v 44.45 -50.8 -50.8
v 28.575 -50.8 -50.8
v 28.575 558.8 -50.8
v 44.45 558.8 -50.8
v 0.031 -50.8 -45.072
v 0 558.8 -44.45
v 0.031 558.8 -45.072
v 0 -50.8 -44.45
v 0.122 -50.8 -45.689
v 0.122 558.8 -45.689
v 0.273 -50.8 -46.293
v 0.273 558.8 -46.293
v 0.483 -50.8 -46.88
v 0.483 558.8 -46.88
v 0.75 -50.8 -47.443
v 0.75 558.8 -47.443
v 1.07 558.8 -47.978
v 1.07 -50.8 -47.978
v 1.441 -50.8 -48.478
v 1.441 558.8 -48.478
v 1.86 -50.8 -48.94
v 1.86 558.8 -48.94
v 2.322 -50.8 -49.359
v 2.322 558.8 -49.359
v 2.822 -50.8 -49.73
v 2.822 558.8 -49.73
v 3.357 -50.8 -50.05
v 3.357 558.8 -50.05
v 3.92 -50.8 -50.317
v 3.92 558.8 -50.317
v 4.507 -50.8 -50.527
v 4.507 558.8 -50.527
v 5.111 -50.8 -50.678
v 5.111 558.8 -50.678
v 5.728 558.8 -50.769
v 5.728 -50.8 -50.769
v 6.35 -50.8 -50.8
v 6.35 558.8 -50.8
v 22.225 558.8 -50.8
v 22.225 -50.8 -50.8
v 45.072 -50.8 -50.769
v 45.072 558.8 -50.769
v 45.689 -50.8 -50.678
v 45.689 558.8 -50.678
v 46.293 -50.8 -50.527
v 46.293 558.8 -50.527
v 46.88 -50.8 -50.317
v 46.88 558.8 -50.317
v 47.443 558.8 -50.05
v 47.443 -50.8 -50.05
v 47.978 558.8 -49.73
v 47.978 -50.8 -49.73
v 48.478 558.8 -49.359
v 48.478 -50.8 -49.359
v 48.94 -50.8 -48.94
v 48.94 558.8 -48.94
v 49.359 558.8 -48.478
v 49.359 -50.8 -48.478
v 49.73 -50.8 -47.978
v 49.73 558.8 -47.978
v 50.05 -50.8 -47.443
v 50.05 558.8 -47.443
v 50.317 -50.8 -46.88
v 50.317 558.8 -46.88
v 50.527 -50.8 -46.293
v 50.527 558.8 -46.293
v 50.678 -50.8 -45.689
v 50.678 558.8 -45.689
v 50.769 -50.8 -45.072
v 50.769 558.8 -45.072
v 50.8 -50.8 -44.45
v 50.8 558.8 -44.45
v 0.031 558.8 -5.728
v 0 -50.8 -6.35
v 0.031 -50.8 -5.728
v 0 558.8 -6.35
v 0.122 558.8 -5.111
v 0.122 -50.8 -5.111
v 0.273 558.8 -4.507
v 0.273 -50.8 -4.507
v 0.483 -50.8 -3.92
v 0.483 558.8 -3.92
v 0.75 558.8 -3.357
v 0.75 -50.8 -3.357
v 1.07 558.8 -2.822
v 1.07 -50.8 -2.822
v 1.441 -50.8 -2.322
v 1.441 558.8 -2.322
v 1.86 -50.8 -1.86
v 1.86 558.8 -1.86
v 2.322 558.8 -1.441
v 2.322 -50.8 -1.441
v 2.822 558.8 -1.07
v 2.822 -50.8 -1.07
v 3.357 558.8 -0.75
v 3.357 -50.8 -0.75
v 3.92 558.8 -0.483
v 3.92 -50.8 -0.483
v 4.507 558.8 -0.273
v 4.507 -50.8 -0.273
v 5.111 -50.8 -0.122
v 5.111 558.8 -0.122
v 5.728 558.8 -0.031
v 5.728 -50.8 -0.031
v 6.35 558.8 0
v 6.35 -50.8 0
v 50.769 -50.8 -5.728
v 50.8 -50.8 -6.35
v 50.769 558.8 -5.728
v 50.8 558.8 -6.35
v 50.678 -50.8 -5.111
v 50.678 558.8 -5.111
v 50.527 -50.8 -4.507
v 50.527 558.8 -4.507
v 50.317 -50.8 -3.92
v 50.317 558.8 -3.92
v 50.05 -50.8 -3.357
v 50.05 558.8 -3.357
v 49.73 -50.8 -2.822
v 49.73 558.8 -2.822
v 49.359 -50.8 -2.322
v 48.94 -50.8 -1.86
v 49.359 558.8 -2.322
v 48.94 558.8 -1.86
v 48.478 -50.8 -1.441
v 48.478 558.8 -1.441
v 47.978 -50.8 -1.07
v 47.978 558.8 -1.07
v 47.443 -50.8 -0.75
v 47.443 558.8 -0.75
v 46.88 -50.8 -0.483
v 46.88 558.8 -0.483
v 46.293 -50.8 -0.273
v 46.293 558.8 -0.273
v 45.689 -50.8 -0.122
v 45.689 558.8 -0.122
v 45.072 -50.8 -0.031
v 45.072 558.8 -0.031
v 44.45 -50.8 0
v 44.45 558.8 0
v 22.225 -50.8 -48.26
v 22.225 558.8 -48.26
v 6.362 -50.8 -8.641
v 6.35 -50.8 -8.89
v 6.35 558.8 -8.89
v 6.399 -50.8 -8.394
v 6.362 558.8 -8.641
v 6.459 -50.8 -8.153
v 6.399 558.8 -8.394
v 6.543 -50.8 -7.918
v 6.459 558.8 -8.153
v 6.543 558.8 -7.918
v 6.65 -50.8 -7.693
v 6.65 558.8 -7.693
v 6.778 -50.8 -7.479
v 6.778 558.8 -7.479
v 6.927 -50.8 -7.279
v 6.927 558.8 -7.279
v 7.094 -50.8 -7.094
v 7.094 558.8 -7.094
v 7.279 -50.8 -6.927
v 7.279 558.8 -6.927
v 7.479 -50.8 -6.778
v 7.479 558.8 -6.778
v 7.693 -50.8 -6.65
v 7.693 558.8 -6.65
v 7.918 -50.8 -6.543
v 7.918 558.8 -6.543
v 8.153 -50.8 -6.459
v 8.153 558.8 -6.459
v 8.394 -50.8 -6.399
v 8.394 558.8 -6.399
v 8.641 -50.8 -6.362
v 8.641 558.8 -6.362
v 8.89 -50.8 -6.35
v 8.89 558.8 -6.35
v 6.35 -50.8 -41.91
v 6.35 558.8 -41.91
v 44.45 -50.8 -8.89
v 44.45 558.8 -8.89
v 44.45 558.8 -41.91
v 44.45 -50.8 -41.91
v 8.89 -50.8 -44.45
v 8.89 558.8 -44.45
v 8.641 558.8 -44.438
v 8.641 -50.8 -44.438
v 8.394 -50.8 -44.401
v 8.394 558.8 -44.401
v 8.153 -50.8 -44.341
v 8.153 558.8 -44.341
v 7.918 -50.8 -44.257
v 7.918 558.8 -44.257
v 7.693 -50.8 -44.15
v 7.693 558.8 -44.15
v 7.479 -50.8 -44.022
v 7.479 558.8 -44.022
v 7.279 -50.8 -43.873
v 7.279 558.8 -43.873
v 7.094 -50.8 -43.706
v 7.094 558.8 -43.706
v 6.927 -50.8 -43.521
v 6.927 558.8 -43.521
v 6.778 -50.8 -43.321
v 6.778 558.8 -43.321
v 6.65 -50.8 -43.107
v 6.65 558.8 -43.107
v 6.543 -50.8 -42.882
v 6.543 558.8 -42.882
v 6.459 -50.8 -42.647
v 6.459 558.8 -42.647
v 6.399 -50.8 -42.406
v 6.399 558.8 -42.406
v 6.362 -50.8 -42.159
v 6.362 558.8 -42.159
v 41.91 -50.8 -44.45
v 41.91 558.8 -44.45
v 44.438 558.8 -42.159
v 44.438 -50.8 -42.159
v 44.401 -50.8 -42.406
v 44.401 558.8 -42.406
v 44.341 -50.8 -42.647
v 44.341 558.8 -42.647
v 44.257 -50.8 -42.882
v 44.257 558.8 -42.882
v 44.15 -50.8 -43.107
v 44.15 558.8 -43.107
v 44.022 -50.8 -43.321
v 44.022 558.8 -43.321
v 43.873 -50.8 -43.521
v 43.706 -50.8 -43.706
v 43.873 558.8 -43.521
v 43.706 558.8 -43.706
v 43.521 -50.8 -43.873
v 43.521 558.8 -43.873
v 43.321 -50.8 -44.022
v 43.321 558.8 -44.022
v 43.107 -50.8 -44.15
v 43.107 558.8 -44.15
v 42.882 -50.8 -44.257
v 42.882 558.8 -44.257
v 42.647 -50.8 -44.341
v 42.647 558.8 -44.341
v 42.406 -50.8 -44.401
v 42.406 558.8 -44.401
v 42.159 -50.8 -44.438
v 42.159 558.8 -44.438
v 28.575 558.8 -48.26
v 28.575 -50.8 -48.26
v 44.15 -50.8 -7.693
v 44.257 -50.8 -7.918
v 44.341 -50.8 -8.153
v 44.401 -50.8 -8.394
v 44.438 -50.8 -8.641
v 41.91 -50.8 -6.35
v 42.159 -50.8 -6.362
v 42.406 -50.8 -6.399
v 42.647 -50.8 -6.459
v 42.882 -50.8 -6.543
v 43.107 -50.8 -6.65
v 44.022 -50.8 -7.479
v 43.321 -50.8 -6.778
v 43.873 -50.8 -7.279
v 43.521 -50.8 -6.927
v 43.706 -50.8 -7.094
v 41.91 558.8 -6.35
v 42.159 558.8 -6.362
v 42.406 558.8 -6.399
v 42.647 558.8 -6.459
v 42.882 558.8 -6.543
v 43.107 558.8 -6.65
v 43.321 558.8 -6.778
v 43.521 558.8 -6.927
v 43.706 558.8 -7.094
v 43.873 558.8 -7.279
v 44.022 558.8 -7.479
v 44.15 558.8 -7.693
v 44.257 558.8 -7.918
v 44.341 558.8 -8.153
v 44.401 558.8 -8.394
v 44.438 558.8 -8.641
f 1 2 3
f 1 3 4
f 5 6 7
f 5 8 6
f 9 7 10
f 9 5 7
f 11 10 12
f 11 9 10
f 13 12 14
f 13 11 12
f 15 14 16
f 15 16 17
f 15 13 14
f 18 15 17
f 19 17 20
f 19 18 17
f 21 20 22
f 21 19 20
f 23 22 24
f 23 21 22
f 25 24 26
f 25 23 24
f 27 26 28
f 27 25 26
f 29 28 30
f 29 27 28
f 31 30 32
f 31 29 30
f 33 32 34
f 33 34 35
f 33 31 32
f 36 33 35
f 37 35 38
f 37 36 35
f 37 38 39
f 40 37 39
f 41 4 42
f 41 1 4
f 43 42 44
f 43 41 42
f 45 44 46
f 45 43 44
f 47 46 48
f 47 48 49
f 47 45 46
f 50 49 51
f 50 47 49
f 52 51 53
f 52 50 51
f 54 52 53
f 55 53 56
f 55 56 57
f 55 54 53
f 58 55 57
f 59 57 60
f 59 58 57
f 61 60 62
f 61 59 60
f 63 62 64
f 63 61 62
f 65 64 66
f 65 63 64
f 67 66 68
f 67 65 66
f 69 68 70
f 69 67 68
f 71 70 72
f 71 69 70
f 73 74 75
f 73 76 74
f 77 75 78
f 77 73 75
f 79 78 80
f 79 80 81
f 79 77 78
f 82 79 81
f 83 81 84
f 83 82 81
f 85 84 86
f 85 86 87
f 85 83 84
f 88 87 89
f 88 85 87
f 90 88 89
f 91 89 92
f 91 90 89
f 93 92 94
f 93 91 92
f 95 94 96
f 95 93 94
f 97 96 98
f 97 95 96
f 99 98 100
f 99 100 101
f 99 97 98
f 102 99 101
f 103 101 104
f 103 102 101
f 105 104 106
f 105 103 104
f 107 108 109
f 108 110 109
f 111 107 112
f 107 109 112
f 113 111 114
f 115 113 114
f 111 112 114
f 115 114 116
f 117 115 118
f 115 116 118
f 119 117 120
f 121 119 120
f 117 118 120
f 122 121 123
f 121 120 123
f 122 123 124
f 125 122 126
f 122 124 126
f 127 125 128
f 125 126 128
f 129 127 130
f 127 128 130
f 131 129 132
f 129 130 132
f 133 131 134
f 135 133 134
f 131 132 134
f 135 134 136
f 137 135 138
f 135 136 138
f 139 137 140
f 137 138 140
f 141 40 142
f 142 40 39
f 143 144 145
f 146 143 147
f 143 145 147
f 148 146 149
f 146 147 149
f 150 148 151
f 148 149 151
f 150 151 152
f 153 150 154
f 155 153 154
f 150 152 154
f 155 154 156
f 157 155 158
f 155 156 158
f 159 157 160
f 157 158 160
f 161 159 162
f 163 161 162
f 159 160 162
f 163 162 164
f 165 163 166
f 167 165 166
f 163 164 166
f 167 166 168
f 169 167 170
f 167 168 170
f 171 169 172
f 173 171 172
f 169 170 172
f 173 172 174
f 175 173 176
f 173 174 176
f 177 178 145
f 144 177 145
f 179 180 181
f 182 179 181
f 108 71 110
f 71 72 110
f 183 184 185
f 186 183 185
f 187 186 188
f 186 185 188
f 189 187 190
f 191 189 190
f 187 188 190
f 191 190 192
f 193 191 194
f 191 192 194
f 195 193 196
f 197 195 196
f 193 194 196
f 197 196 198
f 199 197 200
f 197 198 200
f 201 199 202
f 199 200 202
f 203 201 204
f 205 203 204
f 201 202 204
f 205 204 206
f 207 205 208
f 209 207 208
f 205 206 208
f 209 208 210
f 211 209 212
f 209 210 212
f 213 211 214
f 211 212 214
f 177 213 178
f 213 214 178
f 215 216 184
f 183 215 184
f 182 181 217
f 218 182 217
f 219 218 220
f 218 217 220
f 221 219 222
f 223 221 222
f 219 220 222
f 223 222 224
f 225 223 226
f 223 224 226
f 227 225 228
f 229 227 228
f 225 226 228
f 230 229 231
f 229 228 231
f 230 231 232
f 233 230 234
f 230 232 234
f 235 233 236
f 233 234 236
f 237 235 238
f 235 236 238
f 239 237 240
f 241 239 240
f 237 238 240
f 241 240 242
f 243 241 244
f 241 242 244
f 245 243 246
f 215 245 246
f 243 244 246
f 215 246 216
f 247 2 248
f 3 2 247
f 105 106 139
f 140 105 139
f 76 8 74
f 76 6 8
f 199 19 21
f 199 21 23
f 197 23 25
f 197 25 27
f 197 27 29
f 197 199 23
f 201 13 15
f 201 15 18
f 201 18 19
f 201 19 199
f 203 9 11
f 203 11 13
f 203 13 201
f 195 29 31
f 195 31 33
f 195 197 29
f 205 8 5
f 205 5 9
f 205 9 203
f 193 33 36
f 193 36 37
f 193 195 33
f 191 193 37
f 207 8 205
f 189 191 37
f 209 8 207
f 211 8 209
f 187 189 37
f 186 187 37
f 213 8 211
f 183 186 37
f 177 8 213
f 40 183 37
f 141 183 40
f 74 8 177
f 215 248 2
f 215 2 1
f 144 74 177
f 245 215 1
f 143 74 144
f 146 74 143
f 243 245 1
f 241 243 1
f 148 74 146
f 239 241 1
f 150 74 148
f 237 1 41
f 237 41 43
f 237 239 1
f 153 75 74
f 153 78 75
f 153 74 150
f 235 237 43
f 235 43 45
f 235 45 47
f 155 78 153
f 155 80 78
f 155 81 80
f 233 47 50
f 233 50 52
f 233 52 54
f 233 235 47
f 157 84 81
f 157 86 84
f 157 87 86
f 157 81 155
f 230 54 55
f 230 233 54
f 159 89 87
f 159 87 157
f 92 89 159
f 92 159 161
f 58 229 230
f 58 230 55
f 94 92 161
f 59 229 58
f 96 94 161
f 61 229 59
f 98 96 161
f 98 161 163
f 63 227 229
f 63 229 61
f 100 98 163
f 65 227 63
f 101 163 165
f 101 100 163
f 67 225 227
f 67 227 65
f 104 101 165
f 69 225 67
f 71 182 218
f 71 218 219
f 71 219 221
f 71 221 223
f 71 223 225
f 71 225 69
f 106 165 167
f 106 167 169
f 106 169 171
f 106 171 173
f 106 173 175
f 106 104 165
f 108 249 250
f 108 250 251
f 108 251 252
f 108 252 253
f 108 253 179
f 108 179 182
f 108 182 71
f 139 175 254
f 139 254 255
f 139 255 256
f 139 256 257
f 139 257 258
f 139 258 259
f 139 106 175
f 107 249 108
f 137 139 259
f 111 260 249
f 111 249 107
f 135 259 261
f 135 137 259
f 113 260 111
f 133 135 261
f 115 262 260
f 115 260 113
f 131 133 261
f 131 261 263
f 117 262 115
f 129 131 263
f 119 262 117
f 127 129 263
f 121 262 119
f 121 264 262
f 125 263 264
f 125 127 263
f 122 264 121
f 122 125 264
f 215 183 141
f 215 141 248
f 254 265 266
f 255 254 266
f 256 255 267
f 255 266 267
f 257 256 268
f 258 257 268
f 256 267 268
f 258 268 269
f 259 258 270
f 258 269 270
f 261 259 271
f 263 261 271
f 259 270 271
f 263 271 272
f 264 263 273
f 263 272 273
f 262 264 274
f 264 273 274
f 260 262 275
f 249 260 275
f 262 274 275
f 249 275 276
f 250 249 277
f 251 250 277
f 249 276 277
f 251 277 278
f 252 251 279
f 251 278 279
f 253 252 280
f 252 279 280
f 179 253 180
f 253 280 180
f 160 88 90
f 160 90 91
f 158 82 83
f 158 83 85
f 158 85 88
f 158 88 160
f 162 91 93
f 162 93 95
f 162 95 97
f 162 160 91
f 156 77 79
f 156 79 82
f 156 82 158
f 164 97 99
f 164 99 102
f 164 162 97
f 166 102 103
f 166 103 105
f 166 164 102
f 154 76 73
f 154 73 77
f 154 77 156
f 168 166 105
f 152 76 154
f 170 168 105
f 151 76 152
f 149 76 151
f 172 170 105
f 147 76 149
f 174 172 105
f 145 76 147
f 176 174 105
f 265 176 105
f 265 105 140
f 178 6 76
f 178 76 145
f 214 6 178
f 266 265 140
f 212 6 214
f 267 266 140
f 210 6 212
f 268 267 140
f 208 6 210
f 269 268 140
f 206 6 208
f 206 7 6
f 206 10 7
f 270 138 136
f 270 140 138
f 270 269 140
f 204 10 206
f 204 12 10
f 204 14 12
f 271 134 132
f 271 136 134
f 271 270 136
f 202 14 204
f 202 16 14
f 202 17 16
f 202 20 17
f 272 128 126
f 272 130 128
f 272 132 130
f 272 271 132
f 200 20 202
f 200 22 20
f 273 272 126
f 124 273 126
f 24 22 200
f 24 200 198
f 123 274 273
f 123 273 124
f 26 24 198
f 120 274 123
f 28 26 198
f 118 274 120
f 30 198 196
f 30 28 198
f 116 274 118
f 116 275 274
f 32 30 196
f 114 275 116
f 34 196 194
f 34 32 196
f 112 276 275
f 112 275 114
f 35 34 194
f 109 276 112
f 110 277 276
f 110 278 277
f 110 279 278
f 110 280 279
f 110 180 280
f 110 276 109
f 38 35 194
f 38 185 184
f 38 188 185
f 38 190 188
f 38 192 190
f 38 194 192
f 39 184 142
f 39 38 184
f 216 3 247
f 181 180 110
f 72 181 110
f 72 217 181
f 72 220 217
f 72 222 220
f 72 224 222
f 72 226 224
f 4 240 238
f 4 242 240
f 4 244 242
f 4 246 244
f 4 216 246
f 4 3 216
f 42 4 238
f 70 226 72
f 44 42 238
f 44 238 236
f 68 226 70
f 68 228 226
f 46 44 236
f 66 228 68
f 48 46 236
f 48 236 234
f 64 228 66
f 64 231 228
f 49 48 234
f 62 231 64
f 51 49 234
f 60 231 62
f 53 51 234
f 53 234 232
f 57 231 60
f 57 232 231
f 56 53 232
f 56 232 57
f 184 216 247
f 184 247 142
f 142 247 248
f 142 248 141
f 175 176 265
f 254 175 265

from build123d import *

# Parameters (mm, degrees)
SKETCH1_W           = 50.8
SKETCH1_H           = 50.8
BOSS_EXTRUDE1_DEPTH = 558.8
SKETCH3_W           = 50.8
SKETCH3_H           = 50.8
BOSS_EXTRUDE2_DEPTH = 50.8
FILLET2_R           = 6.35
SKETCH4_W           = 6.35
SKETCH4_H           = 609.6
CUT_EXTRUDE2_DEPTH  = 2.54
CUT_EXTRUDE3_DEPTH  = 614.818735459


with BuildPart() as part:
    # Sketch1 → Boss-Extrude1 (new body)
    with BuildSketch(Plane(origin=(0, 0, 0), x_dir=(1, 0, 0), z_dir=(0, 1, 0))):
        with Locations((25.4, 25.4)):
            Rectangle(SKETCH1_W, SKETCH1_H)
    extrude(amount=BOSS_EXTRUDE1_DEPTH)

    # Sketch3 → Boss-Extrude2 (add)
    with BuildSketch(Plane.XZ):
        with Locations((25.4, -25.4)):
            Rectangle(SKETCH3_W, SKETCH3_H)
    extrude(amount=BOSS_EXTRUDE2_DEPTH)

    # Fillet2
    fillet2_edges = [part.edges().sort_by_distance(p)[0] for p in [
        (0, 254, -50.8),
        (50.8, 254, -50.8),
        (50.8, 254, 0),
        (0, 254, 0),
    ]]
    fillet(fillet2_edges, radius=FILLET2_R)

    # Sketch4 → Cut-Extrude2 (cut)
    with BuildSketch(Plane(origin=(0, 0, -50.8), x_dir=(-1, 0, 0), z_dir=(0, 0, -1))):
        with Locations((-25.4, 254)):
            Rectangle(SKETCH4_W, SKETCH4_H)
    extrude(amount=-CUT_EXTRUDE2_DEPTH, mode=Mode.SUBTRACT)

    # Sketch5 → Cut-Extrude3 (cut, through all)
    with BuildSketch(Plane(origin=(0, 558.8, 0), x_dir=(1, 0, 0), z_dir=(0, 1, 0))):
        with BuildLine():
            Line((34.925, 44.45), (15.875, 44.45))
            Line((15.875, 44.45), (8.89, 44.45))
            ThreePointArc((8.89, 44.45), (7.093948776, 43.706051224), (6.35, 41.91))
            Line((6.35, 41.91), (6.35, 8.89))
            ThreePointArc((6.35, 8.89), (7.093948776, 7.093948776), (8.89, 6.35))
            Line((8.89, 6.35), (41.91, 6.35))
            ThreePointArc((41.91, 6.35), (43.706051224, 7.093948776), (44.45, 8.89))
            Line((44.45, 8.89), (44.45, 41.91))
            ThreePointArc((44.45, 41.91), (43.706051224, 43.706051224), (41.91, 44.45))
            Line((41.91, 44.45), (34.925, 44.45))
        make_face()
    extrude(amount=-CUT_EXTRUDE3_DEPTH, mode=Mode.SUBTRACT)


solid = part.part
